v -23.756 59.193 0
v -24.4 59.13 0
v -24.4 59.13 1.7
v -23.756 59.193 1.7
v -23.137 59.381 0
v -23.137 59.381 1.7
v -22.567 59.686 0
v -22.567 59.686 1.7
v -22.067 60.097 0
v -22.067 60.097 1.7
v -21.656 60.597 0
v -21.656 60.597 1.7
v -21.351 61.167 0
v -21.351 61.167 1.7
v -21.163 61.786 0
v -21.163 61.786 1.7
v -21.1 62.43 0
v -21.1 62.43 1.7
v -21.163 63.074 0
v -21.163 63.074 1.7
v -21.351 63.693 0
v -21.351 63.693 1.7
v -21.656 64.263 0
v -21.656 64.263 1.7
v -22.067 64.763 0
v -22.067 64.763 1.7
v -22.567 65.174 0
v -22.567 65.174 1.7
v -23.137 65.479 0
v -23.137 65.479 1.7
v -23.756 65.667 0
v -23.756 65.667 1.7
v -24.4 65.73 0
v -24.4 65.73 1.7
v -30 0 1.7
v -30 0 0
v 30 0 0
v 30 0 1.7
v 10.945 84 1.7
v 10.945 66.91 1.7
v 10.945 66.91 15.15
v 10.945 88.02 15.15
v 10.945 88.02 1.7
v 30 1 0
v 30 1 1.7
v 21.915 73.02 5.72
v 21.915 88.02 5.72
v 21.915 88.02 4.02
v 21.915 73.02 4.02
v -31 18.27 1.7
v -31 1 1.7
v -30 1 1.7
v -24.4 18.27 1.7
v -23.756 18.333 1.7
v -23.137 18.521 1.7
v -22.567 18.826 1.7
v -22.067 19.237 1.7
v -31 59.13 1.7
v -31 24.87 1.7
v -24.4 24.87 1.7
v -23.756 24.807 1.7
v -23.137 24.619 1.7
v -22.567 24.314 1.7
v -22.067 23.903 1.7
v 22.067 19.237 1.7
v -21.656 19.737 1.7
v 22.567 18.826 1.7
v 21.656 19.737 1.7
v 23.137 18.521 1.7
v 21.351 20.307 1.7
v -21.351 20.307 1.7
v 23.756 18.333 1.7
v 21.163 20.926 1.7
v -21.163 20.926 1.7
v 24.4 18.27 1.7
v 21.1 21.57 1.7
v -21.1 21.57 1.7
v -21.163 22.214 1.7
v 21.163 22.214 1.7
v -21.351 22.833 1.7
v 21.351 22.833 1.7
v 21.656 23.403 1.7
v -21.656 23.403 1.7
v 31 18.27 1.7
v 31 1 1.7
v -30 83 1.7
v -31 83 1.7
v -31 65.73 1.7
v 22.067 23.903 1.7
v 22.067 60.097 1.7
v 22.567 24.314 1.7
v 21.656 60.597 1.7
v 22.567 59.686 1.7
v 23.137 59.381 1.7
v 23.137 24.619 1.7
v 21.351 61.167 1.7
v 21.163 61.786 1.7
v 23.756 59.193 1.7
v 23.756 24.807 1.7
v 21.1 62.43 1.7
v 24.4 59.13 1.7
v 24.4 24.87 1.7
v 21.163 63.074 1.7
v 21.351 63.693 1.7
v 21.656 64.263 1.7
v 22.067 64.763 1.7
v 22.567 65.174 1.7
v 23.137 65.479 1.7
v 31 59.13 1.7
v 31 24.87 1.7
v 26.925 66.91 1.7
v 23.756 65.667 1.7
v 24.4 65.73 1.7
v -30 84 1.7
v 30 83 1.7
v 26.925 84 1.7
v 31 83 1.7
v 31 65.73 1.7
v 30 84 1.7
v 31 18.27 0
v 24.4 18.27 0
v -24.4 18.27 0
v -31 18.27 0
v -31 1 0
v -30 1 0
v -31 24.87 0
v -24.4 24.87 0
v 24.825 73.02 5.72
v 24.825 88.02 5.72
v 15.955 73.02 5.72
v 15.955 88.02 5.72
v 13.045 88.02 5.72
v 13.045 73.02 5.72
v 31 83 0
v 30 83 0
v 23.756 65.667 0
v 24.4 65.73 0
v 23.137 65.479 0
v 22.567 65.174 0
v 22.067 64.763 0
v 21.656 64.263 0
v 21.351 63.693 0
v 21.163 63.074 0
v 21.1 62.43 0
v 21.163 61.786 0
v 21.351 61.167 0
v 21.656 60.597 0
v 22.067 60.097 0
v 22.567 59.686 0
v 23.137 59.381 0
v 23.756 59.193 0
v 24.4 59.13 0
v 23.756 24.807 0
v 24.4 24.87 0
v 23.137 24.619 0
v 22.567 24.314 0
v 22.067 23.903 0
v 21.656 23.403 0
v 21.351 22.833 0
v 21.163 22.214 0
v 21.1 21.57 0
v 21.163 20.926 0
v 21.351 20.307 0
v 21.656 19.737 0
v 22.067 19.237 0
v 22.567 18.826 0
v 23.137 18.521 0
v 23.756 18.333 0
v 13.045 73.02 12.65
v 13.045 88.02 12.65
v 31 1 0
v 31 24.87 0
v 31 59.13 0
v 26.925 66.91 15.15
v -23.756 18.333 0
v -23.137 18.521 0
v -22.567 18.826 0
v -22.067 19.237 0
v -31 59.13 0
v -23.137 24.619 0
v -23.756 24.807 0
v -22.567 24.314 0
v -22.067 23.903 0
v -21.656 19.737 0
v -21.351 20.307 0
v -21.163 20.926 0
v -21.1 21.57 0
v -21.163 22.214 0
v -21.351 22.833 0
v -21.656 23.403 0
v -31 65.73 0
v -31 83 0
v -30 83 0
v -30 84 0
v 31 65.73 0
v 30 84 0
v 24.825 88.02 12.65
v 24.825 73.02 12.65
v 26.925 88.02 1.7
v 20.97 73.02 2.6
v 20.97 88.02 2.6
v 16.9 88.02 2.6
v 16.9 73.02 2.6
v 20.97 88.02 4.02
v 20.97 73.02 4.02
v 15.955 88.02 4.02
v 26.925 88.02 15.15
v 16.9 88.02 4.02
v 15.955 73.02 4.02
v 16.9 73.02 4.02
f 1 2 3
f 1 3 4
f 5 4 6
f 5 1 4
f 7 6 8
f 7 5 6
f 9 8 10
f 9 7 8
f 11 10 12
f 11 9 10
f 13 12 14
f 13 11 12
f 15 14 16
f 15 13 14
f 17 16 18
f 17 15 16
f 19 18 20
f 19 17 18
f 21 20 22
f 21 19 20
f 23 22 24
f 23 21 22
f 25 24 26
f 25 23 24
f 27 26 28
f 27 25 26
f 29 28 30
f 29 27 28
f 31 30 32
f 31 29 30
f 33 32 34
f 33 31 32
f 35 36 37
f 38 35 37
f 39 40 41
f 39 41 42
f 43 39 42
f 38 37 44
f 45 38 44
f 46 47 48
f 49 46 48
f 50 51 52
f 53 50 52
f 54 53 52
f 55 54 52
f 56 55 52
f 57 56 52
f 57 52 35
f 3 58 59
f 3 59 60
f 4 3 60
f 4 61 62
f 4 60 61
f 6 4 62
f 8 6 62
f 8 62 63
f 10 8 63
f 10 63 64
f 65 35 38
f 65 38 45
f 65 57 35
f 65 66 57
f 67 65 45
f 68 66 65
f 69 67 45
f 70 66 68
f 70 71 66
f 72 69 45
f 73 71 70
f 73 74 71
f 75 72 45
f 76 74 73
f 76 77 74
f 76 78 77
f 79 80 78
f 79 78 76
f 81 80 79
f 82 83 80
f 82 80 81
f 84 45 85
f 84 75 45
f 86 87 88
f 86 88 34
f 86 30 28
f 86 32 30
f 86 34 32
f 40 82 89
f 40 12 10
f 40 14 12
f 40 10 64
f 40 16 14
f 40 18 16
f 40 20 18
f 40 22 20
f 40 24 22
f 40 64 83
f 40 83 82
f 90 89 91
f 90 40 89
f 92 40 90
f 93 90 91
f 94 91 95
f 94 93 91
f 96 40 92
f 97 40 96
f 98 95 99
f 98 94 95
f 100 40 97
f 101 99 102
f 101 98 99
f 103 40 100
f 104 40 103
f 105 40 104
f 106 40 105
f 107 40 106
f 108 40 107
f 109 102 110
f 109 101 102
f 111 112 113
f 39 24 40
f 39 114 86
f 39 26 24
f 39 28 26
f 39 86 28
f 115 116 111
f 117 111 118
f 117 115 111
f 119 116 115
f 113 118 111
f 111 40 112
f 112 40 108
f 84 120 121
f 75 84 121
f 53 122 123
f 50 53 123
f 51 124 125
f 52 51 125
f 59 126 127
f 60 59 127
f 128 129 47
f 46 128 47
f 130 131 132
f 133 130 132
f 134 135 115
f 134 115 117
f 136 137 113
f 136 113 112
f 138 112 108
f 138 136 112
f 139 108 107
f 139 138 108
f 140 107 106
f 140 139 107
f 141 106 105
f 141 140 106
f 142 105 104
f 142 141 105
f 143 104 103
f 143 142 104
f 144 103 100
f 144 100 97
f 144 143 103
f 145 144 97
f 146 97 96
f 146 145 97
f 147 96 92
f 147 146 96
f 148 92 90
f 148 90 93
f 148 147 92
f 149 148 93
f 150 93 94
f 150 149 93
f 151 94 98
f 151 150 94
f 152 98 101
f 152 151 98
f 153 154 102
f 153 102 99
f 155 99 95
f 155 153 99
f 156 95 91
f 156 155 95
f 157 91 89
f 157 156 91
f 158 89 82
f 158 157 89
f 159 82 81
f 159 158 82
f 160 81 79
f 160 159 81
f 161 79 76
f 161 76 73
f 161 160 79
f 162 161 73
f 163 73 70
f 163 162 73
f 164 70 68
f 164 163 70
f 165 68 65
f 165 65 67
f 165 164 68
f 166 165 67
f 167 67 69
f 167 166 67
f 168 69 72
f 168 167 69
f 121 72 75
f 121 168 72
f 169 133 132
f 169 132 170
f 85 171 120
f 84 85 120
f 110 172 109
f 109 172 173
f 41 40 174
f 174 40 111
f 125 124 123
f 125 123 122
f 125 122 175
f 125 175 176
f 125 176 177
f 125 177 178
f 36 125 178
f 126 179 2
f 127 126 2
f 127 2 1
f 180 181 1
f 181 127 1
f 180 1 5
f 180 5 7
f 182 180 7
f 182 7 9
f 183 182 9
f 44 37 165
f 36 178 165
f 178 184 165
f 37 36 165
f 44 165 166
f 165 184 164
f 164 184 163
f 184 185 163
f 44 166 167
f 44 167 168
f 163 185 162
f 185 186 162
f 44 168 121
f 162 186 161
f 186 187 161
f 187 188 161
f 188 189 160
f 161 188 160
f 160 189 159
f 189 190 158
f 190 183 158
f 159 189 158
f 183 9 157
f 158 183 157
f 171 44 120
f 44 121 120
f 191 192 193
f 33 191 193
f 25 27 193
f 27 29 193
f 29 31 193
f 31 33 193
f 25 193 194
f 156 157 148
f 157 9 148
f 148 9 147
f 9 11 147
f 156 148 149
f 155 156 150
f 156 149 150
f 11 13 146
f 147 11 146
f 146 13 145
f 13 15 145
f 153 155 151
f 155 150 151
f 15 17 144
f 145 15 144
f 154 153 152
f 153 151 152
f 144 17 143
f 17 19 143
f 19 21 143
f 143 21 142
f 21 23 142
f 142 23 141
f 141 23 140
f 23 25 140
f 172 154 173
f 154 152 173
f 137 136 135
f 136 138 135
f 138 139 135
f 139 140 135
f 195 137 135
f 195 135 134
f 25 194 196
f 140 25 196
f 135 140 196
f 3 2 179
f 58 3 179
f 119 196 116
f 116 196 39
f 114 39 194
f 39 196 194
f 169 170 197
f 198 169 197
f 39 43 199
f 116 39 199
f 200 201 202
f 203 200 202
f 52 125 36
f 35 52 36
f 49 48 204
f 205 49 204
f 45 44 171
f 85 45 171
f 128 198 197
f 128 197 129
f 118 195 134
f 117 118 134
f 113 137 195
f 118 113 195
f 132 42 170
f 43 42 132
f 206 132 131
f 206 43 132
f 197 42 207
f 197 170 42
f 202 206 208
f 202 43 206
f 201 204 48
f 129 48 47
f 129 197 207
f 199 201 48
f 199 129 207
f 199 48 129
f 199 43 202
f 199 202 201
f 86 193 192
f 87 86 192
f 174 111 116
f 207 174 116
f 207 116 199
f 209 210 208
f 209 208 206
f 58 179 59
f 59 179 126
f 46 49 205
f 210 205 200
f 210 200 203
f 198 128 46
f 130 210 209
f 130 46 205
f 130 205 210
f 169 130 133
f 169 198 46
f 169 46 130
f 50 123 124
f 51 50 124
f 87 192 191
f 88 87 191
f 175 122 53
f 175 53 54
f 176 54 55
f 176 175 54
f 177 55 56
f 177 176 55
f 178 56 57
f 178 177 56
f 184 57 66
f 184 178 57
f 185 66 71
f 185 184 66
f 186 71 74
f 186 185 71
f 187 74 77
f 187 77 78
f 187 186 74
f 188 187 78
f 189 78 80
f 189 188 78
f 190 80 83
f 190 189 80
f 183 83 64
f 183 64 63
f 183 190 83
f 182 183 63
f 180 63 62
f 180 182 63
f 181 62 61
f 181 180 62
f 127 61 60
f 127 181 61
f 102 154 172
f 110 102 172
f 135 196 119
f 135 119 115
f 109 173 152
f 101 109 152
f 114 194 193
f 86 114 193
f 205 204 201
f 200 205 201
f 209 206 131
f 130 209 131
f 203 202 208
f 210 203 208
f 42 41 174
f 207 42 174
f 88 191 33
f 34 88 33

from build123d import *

# Parameters (mm, degrees)
PAD_DEPTH       = 1.7
SKETCH004_W     = 15.98
SKETCH004_H     = 21.11
PAD007_DEPTH    = 13.45
POCKET008_DEPTH = 15


with BuildPart() as part:
    # Sketch → Pad (new body)
    with BuildSketch(Plane.XY):
        with BuildLine():
            Line((0, 0), (30, 0))
            Line((30, 0), (30, 1))
            Line((30, 1), (31, 1))
            Line((31, 1), (31, 18.27))
            Line((31, 18.27), (24.4, 18.27))
            ThreePointArc((24.4, 24.87), (21.1, 21.57), (24.4, 18.27))
            Line((24.4, 24.87), (31, 24.87))
            Line((31, 24.87), (31, 59.13))
            Line((31, 59.13), (24.4, 59.13))
            ThreePointArc((24.4, 65.73), (21.1, 62.43), (24.4, 59.13))
            Line((24.4, 65.73), (31, 65.73))
            Line((31, 65.73), (31, 83))
            Line((30, 83), (31, 83))
            Line((30, 84), (30, 83))
            Line((30, 84), (0, 84))
            Line((0, 84), (-30, 84))
            Line((-30, 84), (-30, 83))
            Line((-30, 83), (-31, 83))
            Line((-31, 83), (-31, 65.73))
            Line((-31, 65.73), (-24.4, 65.73))
            ThreePointArc((-24.4, 59.13), (-21.1, 62.43), (-24.4, 65.73))
            Line((-24.4, 59.13), (-31, 59.13))
            Line((-31, 59.13), (-31, 24.87))
            Line((-31, 24.87), (-24.4, 24.87))
            ThreePointArc((-24.4, 18.27), (-21.1, 21.57), (-24.4, 24.87))
            Line((-24.4, 18.27), (-31, 18.27))
            Line((-31, 18.27), (-31, 1))
            Line((-31, 1), (-30, 1))
            Line((-30, 1), (-30, 0))
            Line((-30, 0), (0, 0))
        make_face()
    extrude(amount=PAD_DEPTH)

    # Sketch004 → Pad007 (new body)
    with BuildSketch(Plane.XY.offset(1.7)):
        with Locations((18.935, 77.465)):
            Rectangle(SKETCH004_W, SKETCH004_H)
    extrude(amount=PAD007_DEPTH)

    # Sketch019 → Pocket008 (cut)
    with BuildSketch(Plane(origin=(0, 88.02, 0), x_dir=(-1, 0, 0), z_dir=(0, 1, 0))):
        Polygon((-24.825, 12.65), (-24.825, 5.72), (-21.915, 5.72), (-21.915, 4.02), (-20.97, 4.02), (-20.97, 2.6), (-16.9, 2.6), (-16.9, 4.02), (-15.955, 4.02), (-15.955, 5.72), (-13.045, 5.72), (-13.045, 12.65), align=None)
    extrude(amount=-POCKET008_DEPTH, mode=Mode.SUBTRACT)


solid = part.part
